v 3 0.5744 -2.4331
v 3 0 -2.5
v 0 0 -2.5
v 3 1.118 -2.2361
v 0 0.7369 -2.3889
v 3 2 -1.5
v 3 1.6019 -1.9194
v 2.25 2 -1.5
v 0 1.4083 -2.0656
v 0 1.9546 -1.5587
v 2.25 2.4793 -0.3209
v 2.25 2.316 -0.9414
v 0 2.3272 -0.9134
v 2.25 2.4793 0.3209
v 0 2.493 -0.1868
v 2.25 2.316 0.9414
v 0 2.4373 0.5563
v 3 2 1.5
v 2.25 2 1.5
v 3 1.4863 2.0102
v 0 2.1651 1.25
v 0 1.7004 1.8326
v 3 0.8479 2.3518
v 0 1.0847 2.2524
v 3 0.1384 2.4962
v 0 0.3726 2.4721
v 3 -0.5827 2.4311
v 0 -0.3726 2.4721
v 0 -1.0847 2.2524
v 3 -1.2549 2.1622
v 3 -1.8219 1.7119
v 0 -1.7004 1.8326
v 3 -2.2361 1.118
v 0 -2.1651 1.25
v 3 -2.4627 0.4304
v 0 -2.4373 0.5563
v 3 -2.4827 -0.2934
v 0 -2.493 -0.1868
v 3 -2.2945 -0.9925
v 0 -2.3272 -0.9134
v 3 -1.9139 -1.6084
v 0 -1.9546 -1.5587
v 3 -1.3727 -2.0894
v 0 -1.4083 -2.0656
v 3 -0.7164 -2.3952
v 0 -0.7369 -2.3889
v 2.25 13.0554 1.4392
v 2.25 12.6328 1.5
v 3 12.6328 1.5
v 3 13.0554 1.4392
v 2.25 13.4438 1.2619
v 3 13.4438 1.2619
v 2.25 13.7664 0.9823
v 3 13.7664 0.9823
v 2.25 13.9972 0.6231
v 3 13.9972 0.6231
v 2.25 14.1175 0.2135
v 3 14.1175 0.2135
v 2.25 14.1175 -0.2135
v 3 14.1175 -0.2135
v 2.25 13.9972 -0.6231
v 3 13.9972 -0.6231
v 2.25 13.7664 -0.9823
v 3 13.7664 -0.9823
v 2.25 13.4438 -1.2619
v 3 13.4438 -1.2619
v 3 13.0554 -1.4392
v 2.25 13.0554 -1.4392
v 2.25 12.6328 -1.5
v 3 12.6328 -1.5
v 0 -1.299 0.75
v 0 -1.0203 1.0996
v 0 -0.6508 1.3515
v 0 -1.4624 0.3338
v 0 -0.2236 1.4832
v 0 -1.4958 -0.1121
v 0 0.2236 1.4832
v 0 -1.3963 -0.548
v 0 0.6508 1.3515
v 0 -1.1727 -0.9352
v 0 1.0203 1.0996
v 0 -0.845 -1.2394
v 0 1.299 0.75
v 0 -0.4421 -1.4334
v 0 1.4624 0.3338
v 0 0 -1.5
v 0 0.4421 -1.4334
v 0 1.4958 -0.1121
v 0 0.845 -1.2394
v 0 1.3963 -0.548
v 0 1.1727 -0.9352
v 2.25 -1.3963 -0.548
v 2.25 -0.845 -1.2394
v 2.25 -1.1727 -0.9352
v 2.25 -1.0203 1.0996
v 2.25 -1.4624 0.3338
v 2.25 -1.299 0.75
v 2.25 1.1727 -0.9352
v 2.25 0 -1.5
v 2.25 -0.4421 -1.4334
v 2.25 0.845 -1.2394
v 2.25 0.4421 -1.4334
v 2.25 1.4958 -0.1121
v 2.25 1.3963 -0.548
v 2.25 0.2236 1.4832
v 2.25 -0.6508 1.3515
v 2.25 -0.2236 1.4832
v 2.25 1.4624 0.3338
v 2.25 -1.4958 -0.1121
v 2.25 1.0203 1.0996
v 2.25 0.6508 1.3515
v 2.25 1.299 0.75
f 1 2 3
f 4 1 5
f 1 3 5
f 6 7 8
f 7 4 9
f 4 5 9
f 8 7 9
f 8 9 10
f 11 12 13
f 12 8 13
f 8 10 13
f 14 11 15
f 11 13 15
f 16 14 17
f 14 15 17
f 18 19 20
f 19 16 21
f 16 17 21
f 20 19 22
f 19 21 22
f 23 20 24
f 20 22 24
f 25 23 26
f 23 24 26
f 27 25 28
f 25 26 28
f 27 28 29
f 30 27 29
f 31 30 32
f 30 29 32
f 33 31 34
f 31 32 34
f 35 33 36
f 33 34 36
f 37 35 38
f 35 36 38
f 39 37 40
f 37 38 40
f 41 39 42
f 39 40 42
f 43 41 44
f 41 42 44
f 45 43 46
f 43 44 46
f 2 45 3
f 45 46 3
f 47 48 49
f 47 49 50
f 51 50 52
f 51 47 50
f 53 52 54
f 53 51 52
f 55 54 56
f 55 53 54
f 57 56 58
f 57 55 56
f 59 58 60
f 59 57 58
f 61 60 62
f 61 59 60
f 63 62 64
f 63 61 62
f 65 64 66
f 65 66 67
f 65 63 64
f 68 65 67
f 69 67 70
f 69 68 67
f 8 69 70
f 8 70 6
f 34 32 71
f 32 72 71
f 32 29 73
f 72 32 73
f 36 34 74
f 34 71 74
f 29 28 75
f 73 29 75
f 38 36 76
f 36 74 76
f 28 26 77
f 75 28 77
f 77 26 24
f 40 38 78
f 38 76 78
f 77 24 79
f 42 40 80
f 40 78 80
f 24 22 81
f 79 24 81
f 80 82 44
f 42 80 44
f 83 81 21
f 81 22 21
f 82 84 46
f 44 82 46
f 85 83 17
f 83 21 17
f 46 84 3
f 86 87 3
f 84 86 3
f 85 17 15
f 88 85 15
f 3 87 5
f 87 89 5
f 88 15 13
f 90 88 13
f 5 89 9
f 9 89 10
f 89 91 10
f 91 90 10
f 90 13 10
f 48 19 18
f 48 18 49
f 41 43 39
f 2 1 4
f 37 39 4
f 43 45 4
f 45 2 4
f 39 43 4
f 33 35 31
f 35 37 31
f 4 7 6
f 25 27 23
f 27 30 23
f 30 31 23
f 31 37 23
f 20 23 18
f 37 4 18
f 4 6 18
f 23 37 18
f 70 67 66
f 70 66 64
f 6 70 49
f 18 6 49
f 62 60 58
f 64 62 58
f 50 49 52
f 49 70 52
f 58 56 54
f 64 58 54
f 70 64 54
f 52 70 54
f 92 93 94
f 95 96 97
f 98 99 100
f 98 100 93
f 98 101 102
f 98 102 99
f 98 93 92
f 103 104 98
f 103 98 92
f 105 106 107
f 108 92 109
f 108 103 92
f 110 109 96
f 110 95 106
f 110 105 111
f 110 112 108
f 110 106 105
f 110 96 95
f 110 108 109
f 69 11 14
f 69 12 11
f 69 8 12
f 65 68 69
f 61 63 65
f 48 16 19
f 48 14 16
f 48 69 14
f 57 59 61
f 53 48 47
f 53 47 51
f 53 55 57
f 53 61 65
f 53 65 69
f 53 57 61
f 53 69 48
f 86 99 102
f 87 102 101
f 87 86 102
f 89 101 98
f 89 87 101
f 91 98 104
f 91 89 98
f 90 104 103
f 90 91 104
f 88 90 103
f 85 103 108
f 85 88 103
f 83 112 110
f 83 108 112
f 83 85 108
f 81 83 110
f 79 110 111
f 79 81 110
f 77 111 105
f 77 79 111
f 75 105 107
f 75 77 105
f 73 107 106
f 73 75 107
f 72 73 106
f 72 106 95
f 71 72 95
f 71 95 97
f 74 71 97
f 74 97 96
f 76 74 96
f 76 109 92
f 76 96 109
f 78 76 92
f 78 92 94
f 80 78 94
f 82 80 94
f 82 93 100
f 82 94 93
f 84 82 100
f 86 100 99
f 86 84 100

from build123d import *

# Parameters (mm, degrees)
SKETCH1_R           = 2.5
SKETCH1_R_2         = 1.5
BOSS_EXTRUDE1_DEPTH = 3
BOSS_EXTRUDE2_START = -0.75
BOSS_EXTRUDE2_DEPTH = 0.75


with BuildPart() as part:
    # Sketch1 → Boss-Extrude1 (new body)
    with BuildSketch(Plane(origin=(0, 0, 0), x_dir=(0, 0, -1), z_dir=(1, 0, 0))):
        Circle(SKETCH1_R)
        Circle(SKETCH1_R_2, mode=Mode.SUBTRACT)
    extrude(amount=BOSS_EXTRUDE1_DEPTH)

    # Sketch2 → Boss-Extrude2 (add)
    with BuildSketch(Plane(origin=(3, 0, 0), x_dir=(0, 0, -1), z_dir=(1, 0, 0)).offset(BOSS_EXTRUDE2_START)):
        with BuildLine():
            Line((-1.5, 2), (-1.5, 12.632795692))
            ThreePointArc((-1.5, 12.632795692), (0, 14.132795692), (1.5, 12.632795692))
            Line((1.5, 12.632795692), (1.5, 2))
            ThreePointArc((1.5, 2), (0, -2.5), (-1.5, 2))
        make_face()
    extrude(amount=BOSS_EXTRUDE2_DEPTH)


solid = part.part
